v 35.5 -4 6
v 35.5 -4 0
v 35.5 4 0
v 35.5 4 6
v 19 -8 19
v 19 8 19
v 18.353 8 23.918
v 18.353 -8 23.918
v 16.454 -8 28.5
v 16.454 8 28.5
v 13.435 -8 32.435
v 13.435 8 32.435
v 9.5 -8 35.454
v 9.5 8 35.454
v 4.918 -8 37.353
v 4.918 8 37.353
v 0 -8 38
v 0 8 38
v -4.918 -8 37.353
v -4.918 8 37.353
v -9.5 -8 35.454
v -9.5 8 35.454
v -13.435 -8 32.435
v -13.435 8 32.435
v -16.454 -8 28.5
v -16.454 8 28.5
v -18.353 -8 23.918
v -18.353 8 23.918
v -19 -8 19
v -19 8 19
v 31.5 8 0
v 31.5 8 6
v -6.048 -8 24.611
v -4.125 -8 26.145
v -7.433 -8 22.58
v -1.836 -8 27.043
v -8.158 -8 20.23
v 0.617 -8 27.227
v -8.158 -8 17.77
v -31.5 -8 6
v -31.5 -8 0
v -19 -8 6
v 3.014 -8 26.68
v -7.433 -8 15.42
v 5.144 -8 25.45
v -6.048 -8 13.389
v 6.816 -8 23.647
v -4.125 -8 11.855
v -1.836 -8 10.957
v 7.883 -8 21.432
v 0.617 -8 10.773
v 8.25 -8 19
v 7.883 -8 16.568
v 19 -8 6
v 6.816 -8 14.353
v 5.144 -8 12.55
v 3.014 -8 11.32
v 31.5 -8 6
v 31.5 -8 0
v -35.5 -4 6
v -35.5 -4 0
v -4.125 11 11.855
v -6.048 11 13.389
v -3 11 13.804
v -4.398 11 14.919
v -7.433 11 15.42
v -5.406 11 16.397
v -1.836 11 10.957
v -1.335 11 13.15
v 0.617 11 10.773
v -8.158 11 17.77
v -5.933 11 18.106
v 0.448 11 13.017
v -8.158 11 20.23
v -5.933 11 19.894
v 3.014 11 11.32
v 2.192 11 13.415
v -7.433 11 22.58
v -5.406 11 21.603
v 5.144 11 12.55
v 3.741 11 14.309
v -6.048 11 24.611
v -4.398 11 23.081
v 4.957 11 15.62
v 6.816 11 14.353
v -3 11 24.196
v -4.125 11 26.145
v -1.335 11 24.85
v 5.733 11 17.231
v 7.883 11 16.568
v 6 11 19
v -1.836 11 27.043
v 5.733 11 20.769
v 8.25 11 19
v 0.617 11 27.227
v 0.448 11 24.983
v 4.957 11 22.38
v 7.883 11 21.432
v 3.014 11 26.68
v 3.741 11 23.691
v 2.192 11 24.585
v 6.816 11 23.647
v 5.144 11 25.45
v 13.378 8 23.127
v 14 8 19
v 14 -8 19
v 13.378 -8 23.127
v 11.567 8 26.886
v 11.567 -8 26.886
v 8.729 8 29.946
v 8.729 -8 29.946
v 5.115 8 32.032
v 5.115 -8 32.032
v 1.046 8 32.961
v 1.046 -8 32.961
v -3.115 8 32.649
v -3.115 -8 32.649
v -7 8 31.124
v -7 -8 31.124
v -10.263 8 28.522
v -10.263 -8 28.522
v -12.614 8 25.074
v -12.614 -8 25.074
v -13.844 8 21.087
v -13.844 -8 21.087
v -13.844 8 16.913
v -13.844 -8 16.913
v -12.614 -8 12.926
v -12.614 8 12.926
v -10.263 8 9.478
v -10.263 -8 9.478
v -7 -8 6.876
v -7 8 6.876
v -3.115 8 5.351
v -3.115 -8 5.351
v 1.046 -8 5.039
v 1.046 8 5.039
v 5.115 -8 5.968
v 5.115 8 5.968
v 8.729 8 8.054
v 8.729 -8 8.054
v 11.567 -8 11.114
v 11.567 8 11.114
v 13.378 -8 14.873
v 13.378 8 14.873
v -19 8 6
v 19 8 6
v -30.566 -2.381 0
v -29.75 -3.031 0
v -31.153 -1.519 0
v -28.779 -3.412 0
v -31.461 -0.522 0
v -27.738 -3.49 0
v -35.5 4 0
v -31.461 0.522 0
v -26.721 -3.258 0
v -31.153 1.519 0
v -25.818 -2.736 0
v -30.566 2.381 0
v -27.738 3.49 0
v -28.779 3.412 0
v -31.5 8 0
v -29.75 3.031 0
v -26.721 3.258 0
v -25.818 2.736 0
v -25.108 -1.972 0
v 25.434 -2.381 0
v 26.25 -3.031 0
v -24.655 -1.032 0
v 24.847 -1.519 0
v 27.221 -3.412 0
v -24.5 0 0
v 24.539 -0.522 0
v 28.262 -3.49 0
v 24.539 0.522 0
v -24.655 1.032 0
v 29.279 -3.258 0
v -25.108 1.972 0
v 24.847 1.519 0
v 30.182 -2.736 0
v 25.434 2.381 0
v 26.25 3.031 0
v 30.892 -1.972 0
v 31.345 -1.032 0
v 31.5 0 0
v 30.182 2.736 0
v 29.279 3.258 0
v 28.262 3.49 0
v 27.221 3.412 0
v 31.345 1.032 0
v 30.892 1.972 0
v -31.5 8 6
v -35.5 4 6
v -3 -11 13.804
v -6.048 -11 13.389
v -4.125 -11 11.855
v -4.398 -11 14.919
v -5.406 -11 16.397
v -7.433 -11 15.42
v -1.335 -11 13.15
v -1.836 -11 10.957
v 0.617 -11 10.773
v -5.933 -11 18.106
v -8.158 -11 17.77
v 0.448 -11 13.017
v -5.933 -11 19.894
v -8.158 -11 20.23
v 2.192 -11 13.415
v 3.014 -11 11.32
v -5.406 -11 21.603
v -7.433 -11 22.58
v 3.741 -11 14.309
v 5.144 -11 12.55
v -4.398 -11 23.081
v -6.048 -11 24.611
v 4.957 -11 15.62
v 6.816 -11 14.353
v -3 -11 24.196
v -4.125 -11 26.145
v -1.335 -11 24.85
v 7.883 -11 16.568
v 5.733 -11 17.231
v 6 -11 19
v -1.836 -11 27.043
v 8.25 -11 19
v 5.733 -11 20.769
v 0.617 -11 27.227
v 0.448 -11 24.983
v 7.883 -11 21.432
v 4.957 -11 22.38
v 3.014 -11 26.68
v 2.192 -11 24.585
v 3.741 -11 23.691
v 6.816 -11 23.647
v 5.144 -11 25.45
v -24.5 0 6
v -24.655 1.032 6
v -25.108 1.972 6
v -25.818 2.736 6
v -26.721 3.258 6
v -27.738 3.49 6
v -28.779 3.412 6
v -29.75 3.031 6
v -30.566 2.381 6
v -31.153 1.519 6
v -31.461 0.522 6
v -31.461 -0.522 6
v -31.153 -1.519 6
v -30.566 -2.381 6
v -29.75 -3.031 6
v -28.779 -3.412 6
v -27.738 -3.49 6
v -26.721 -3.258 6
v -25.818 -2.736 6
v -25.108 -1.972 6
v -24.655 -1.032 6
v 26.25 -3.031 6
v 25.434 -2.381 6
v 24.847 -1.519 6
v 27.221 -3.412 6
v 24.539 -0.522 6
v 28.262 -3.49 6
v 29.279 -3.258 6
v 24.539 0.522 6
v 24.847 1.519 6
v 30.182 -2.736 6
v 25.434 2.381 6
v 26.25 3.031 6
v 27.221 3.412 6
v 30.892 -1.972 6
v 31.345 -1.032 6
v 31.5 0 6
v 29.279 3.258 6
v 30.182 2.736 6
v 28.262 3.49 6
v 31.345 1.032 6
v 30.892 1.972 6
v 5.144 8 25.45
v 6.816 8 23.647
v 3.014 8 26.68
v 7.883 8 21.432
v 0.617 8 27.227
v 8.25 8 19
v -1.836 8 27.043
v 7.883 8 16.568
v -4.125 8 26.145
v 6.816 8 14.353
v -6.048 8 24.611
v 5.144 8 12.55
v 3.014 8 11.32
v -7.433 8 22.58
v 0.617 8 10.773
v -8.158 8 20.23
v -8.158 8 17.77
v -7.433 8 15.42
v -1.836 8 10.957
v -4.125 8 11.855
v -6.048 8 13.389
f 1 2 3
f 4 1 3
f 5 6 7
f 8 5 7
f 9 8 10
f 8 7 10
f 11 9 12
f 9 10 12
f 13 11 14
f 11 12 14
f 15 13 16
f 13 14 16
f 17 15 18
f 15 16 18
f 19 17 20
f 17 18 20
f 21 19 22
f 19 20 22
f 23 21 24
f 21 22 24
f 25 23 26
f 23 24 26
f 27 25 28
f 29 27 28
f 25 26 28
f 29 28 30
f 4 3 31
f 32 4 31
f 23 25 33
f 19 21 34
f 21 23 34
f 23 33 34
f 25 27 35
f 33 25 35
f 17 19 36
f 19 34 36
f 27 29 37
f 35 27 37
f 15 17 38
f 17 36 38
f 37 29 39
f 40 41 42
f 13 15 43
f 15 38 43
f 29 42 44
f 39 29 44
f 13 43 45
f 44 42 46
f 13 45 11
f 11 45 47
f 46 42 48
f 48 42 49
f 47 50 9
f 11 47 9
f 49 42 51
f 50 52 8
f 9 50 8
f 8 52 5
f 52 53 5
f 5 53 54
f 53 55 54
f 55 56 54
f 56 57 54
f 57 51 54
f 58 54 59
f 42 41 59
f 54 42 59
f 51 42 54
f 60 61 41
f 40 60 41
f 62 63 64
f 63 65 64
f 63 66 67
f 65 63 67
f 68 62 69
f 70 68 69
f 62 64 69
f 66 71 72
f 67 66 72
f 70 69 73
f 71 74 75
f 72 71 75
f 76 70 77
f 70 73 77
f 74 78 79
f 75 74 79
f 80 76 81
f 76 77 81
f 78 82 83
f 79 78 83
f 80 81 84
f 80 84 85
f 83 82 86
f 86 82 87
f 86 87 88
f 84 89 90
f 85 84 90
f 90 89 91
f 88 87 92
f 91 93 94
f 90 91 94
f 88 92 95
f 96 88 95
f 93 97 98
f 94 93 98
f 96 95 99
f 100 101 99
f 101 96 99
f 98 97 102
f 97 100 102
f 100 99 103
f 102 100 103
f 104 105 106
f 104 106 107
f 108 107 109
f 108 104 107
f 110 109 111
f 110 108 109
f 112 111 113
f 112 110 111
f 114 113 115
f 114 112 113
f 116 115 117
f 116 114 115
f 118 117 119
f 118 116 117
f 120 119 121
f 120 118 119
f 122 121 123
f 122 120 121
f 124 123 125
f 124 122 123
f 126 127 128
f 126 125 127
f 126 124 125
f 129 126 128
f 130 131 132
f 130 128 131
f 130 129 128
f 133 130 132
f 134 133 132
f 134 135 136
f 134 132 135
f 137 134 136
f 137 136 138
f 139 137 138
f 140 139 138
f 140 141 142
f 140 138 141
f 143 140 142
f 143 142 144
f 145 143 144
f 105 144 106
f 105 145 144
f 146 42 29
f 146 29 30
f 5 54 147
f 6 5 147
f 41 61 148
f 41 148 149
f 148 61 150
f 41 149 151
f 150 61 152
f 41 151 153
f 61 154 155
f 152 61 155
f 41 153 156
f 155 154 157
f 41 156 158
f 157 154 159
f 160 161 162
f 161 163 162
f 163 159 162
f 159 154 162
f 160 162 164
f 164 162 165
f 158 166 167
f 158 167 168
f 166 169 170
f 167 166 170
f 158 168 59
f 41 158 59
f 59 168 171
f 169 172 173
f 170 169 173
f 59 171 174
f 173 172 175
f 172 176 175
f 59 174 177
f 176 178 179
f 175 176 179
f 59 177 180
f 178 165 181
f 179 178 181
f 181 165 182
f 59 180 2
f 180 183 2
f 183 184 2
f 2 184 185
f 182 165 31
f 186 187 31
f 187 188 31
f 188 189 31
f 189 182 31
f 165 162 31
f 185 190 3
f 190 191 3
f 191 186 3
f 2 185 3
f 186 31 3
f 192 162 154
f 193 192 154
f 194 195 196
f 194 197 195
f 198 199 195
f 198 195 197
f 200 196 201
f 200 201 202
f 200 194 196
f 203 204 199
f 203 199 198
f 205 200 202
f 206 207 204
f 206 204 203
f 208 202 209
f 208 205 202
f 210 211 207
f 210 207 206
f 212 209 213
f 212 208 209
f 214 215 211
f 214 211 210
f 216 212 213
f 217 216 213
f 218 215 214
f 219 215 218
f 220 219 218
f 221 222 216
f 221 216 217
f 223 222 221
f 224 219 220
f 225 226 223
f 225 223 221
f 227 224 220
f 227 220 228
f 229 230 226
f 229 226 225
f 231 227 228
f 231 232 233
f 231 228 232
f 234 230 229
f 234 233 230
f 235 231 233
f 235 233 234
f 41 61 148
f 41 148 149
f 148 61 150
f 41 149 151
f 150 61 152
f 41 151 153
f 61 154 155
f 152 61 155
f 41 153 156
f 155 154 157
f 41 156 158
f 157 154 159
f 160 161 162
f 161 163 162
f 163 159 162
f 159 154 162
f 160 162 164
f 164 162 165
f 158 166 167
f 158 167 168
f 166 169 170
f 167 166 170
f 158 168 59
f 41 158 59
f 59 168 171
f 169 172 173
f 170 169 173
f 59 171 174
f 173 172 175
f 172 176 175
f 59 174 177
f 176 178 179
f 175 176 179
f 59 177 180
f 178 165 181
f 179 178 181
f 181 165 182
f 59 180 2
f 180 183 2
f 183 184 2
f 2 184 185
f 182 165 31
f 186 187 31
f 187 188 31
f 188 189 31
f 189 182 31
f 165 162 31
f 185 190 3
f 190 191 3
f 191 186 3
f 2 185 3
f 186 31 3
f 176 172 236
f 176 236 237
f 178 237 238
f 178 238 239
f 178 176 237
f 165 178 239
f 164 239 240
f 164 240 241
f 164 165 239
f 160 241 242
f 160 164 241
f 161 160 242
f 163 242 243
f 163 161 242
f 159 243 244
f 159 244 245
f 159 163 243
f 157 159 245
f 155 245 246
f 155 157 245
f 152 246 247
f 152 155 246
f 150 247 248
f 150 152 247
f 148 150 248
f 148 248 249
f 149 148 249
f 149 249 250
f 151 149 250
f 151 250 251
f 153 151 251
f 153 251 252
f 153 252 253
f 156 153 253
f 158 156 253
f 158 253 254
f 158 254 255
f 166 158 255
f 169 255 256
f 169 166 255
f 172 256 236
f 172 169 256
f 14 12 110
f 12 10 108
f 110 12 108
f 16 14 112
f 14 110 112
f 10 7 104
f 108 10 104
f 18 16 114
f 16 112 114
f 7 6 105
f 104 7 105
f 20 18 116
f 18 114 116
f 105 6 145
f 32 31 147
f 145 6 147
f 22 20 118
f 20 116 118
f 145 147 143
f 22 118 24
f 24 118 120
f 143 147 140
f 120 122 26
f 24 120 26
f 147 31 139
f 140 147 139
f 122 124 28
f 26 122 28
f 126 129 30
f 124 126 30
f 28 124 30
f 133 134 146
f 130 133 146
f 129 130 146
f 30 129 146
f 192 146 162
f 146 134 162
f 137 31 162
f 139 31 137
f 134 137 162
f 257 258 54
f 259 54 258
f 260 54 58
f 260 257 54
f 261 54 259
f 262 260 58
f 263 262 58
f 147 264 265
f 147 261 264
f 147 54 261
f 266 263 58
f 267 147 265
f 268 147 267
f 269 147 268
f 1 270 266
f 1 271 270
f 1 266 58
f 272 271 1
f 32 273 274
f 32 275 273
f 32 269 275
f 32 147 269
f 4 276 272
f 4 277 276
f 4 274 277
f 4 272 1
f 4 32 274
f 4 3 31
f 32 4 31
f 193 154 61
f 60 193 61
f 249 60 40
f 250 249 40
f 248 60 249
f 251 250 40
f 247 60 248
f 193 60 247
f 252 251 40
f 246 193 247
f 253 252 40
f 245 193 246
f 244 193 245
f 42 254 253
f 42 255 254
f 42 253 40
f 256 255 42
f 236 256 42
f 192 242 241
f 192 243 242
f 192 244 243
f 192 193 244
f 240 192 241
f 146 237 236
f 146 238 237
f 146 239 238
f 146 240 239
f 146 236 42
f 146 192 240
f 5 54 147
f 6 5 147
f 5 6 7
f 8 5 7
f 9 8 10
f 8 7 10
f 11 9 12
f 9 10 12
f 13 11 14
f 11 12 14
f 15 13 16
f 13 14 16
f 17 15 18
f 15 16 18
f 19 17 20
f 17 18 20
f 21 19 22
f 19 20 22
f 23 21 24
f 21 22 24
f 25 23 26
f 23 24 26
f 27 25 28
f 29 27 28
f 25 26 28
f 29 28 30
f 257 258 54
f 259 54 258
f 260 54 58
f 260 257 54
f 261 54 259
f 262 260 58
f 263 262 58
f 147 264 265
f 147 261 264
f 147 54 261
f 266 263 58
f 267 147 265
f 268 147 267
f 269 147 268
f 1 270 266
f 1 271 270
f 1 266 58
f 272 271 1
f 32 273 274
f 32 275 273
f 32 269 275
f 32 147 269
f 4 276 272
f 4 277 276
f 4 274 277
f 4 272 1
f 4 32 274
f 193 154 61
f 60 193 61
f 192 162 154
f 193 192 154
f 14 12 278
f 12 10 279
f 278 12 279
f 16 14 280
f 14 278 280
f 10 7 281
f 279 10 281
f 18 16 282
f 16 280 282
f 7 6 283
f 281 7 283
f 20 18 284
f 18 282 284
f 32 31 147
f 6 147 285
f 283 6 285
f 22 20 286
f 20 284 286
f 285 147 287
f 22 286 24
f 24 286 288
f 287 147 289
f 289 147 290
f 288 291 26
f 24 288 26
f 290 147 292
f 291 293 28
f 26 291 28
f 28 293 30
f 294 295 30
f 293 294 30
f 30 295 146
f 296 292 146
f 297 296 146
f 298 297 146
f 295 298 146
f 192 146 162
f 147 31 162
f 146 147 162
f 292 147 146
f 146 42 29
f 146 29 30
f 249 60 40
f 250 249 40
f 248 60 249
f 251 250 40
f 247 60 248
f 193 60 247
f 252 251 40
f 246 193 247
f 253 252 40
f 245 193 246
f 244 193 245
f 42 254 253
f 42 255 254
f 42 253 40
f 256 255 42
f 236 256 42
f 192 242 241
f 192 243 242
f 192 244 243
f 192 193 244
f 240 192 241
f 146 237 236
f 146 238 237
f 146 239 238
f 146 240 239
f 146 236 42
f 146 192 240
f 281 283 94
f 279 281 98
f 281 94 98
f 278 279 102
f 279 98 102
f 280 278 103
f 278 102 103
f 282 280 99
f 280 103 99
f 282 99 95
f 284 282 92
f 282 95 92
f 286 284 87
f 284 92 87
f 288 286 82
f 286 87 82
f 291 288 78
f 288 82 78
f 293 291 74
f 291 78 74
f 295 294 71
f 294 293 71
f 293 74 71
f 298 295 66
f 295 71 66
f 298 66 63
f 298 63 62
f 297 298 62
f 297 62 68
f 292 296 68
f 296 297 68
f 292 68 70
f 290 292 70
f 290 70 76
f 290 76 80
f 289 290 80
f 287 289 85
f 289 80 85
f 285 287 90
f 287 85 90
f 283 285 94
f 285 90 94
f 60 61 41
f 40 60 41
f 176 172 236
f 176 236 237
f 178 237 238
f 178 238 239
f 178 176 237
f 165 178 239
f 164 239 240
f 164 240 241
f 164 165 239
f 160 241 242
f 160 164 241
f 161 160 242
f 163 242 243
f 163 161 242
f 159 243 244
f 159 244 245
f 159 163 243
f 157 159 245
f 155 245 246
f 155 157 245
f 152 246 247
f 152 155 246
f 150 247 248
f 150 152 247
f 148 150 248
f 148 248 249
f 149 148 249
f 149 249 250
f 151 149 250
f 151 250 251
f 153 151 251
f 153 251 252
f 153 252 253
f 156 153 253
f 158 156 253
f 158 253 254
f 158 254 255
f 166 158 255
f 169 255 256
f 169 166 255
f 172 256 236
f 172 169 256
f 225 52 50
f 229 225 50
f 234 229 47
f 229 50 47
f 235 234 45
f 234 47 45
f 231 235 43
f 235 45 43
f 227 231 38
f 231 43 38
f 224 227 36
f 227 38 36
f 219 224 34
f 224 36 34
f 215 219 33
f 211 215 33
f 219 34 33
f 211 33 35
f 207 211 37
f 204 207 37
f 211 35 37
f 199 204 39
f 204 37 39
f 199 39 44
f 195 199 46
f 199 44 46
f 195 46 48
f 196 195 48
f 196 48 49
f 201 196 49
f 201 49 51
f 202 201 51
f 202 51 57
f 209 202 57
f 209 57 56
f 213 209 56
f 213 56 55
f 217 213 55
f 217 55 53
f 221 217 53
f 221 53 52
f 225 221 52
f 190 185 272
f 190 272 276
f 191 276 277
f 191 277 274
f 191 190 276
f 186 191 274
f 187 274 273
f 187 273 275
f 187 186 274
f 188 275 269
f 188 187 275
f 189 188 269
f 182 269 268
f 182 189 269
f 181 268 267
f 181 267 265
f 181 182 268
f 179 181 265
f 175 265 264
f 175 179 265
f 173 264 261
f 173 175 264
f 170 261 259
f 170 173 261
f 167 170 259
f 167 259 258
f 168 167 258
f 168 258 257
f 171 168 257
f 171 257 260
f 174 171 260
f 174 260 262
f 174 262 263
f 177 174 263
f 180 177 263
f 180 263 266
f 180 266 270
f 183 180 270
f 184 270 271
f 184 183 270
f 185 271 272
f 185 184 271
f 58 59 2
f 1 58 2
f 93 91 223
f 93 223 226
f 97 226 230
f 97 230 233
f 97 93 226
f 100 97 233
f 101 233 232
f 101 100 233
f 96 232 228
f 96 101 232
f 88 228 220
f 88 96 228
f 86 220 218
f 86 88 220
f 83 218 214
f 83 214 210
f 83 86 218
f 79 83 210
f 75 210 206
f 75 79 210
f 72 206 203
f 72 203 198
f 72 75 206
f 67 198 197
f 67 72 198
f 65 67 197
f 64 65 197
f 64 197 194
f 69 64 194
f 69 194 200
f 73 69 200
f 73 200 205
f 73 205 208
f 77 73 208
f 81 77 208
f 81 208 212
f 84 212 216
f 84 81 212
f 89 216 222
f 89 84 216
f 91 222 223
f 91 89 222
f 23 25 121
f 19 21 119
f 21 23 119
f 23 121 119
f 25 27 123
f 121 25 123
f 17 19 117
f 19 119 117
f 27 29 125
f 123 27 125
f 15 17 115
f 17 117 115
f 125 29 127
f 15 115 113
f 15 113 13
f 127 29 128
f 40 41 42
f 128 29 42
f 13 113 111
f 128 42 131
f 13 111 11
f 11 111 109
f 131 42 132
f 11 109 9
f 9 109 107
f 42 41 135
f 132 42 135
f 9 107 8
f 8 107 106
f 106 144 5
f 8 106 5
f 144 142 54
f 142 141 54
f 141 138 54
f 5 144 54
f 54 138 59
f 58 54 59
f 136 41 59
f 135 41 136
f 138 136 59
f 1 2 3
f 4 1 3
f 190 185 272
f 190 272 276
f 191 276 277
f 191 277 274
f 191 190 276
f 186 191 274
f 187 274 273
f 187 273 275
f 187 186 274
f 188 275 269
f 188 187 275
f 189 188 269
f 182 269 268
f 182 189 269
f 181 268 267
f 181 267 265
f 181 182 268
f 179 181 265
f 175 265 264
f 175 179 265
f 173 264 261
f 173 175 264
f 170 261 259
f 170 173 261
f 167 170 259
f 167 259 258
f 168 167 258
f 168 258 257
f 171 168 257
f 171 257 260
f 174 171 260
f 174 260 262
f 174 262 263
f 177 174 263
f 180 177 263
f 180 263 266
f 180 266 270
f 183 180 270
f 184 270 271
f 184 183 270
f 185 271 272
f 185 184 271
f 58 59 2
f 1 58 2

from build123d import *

# Parameters (mm, degrees)
CYLINDER001_R     = 3.5
CYLINDER001_DEPTH = 6
CYLINDER003_R     = 6
CYLINDER003_DEPTH = 22
CYLINDER_R        = 3.5
CYLINDER_DEPTH    = 6
BOX_W             = 38
BOX_H             = 16
BOX_DEPTH         = 19
PAD_DEPTH         = 6
CYLINDER002_R     = 19
CYLINDER002_DEPTH = 16
CYLINDER004_R     = 8.25
CYLINDER004_DEPTH = 22
CYLINDER006_R     = 3.5
CYLINDER006_DEPTH = 6
CYLINDER008_R     = 14
CYLINDER008_DEPTH = 22
CYLINDER005_R     = 3.5
CYLINDER005_DEPTH = 6
BOX001_W          = 38
BOX001_H          = 16
BOX001_DEPTH      = 19
PAD001_DEPTH      = 6
CYLINDER007_R     = 19
CYLINDER007_DEPTH = 16
CYLINDER009_R     = 8.25
CYLINDER009_DEPTH = 22


with BuildPart() as cylinder001:
    # Cylinder001 → Cylinder001 (new body)
    with BuildSketch(Plane(origin=(28, 0, 0), x_dir=(1, 0, 0), z_dir=(0, 0, 1))):
        Circle(CYLINDER001_R)
    extrude(amount=CYLINDER001_DEPTH)


with BuildPart() as cylinder003:
    # Cylinder003 → Cylinder003 (new body)
    with BuildSketch(Plane(origin=(0, 11, 19), x_dir=(1, 0, 0), z_dir=(0, -1, 0))):
        Circle(CYLINDER003_R)
    extrude(amount=CYLINDER003_DEPTH)


with BuildPart() as fusion002:
    # Cylinder → Cylinder (new body)
    with BuildSketch(Plane(origin=(-28, 0, 0), x_dir=(1, 0, 0), z_dir=(0, 0, 1))):
        Circle(CYLINDER_R)
    extrude(amount=CYLINDER_DEPTH)

    # Fusion002: union Cylinder001, Cylinder003
    add(cylinder001.part)
    add(cylinder003.part)


with BuildPart() as cube:
    # Box → Box (new body)
    with BuildSketch(Plane(origin=(-19, -8, 0), x_dir=(1, 0, 0), z_dir=(0, 0, 1))):
        with Locations((19, 8)):
            Rectangle(BOX_W, BOX_H)
    extrude(amount=BOX_DEPTH)


with BuildPart() as body:
    # Sketch → Pad (new body)
    with BuildSketch(Plane.XY):
        Polygon((-31.5, -8), (31.5, -8), (35.5, -4), (35.5, 4), (31.5, 8), (-31.5, 8), (-35.5, 4), (-35.5, -4), align=None)
    extrude(amount=PAD_DEPTH)


with BuildPart() as fusion:
    # Cylinder002 → Cylinder002 (new body)
    with BuildSketch(Plane(origin=(0, 8, 19), x_dir=(1, 0, 0), z_dir=(0, -1, 0))):
        Circle(CYLINDER002_R)
    extrude(amount=CYLINDER002_DEPTH)

    # Fusion: union Cube, Body
    add(cube.part)
    add(body.part)


with BuildPart() as template:
    # Cylinder004 → Cylinder004 (new body)
    with BuildSketch(Plane(origin=(0, 11, 19), x_dir=(1, 0, 0), z_dir=(0, -1, 0))):
        Circle(CYLINDER004_R)
    extrude(amount=CYLINDER004_DEPTH)

    # Fusion001: union Fusion
    add(fusion.part)

    # Cut: cut Fusion002
    add(fusion002.part, mode=Mode.SUBTRACT)


with BuildPart() as cylinder006:
    # Cylinder006 → Cylinder006 (new body)
    with BuildSketch(Plane(origin=(28, 0, 0), x_dir=(1, 0, 0), z_dir=(0, 0, 1))):
        Circle(CYLINDER006_R)
    extrude(amount=CYLINDER006_DEPTH)


with BuildPart() as cylinder008:
    # Cylinder008 → Cylinder008 (new body)
    with BuildSketch(Plane(origin=(0, 11, 19), x_dir=(1, 0, 0), z_dir=(0, -1, 0))):
        Circle(CYLINDER008_R)
    extrude(amount=CYLINDER008_DEPTH)


with BuildPart() as fusion005:
    # Cylinder005 → Cylinder005 (new body)
    with BuildSketch(Plane(origin=(-28, 0, 0), x_dir=(1, 0, 0), z_dir=(0, 0, 1))):
        Circle(CYLINDER005_R)
    extrude(amount=CYLINDER005_DEPTH)

    # Fusion005: union Cylinder006, Cylinder008
    add(cylinder006.part)
    add(cylinder008.part)


with BuildPart() as cube001:
    # Box001 → Box001 (new body)
    with BuildSketch(Plane(origin=(-19, -8, 0), x_dir=(1, 0, 0), z_dir=(0, 0, 1))):
        with Locations((19, 8)):
            Rectangle(BOX001_W, BOX001_H)
    extrude(amount=BOX001_DEPTH)


with BuildPart() as body001:
    # Sketch001 → Pad001 (new body)
    with BuildSketch(Plane.XY):
        Polygon((-31.5, -8), (31.5, -8), (35.5, -4), (35.5, 4), (31.5, 8), (-31.5, 8), (-35.5, 4), (-35.5, -4), align=None)
    extrude(amount=PAD001_DEPTH)


with BuildPart() as fusion003:
    # Cylinder007 → Cylinder007 (new body)
    with BuildSketch(Plane(origin=(0, 8, 19), x_dir=(1, 0, 0), z_dir=(0, -1, 0))):
        Circle(CYLINDER007_R)
    extrude(amount=CYLINDER007_DEPTH)

    # Fusion003: union Cube001, Body001
    add(cube001.part)
    add(body001.part)


with BuildPart() as flangeblock:
    # Cylinder009 → Cylinder009 (new body)
    with BuildSketch(Plane(origin=(0, 11, 19), x_dir=(1, 0, 0), z_dir=(0, -1, 0))):
        Circle(CYLINDER009_R)
    extrude(amount=CYLINDER009_DEPTH)

    # Fusion004: union Fusion003
    add(fusion003.part)

    # Cut001: cut Fusion005
    add(fusion005.part, mode=Mode.SUBTRACT)


solid = Compound([template.part, flangeblock.part])
